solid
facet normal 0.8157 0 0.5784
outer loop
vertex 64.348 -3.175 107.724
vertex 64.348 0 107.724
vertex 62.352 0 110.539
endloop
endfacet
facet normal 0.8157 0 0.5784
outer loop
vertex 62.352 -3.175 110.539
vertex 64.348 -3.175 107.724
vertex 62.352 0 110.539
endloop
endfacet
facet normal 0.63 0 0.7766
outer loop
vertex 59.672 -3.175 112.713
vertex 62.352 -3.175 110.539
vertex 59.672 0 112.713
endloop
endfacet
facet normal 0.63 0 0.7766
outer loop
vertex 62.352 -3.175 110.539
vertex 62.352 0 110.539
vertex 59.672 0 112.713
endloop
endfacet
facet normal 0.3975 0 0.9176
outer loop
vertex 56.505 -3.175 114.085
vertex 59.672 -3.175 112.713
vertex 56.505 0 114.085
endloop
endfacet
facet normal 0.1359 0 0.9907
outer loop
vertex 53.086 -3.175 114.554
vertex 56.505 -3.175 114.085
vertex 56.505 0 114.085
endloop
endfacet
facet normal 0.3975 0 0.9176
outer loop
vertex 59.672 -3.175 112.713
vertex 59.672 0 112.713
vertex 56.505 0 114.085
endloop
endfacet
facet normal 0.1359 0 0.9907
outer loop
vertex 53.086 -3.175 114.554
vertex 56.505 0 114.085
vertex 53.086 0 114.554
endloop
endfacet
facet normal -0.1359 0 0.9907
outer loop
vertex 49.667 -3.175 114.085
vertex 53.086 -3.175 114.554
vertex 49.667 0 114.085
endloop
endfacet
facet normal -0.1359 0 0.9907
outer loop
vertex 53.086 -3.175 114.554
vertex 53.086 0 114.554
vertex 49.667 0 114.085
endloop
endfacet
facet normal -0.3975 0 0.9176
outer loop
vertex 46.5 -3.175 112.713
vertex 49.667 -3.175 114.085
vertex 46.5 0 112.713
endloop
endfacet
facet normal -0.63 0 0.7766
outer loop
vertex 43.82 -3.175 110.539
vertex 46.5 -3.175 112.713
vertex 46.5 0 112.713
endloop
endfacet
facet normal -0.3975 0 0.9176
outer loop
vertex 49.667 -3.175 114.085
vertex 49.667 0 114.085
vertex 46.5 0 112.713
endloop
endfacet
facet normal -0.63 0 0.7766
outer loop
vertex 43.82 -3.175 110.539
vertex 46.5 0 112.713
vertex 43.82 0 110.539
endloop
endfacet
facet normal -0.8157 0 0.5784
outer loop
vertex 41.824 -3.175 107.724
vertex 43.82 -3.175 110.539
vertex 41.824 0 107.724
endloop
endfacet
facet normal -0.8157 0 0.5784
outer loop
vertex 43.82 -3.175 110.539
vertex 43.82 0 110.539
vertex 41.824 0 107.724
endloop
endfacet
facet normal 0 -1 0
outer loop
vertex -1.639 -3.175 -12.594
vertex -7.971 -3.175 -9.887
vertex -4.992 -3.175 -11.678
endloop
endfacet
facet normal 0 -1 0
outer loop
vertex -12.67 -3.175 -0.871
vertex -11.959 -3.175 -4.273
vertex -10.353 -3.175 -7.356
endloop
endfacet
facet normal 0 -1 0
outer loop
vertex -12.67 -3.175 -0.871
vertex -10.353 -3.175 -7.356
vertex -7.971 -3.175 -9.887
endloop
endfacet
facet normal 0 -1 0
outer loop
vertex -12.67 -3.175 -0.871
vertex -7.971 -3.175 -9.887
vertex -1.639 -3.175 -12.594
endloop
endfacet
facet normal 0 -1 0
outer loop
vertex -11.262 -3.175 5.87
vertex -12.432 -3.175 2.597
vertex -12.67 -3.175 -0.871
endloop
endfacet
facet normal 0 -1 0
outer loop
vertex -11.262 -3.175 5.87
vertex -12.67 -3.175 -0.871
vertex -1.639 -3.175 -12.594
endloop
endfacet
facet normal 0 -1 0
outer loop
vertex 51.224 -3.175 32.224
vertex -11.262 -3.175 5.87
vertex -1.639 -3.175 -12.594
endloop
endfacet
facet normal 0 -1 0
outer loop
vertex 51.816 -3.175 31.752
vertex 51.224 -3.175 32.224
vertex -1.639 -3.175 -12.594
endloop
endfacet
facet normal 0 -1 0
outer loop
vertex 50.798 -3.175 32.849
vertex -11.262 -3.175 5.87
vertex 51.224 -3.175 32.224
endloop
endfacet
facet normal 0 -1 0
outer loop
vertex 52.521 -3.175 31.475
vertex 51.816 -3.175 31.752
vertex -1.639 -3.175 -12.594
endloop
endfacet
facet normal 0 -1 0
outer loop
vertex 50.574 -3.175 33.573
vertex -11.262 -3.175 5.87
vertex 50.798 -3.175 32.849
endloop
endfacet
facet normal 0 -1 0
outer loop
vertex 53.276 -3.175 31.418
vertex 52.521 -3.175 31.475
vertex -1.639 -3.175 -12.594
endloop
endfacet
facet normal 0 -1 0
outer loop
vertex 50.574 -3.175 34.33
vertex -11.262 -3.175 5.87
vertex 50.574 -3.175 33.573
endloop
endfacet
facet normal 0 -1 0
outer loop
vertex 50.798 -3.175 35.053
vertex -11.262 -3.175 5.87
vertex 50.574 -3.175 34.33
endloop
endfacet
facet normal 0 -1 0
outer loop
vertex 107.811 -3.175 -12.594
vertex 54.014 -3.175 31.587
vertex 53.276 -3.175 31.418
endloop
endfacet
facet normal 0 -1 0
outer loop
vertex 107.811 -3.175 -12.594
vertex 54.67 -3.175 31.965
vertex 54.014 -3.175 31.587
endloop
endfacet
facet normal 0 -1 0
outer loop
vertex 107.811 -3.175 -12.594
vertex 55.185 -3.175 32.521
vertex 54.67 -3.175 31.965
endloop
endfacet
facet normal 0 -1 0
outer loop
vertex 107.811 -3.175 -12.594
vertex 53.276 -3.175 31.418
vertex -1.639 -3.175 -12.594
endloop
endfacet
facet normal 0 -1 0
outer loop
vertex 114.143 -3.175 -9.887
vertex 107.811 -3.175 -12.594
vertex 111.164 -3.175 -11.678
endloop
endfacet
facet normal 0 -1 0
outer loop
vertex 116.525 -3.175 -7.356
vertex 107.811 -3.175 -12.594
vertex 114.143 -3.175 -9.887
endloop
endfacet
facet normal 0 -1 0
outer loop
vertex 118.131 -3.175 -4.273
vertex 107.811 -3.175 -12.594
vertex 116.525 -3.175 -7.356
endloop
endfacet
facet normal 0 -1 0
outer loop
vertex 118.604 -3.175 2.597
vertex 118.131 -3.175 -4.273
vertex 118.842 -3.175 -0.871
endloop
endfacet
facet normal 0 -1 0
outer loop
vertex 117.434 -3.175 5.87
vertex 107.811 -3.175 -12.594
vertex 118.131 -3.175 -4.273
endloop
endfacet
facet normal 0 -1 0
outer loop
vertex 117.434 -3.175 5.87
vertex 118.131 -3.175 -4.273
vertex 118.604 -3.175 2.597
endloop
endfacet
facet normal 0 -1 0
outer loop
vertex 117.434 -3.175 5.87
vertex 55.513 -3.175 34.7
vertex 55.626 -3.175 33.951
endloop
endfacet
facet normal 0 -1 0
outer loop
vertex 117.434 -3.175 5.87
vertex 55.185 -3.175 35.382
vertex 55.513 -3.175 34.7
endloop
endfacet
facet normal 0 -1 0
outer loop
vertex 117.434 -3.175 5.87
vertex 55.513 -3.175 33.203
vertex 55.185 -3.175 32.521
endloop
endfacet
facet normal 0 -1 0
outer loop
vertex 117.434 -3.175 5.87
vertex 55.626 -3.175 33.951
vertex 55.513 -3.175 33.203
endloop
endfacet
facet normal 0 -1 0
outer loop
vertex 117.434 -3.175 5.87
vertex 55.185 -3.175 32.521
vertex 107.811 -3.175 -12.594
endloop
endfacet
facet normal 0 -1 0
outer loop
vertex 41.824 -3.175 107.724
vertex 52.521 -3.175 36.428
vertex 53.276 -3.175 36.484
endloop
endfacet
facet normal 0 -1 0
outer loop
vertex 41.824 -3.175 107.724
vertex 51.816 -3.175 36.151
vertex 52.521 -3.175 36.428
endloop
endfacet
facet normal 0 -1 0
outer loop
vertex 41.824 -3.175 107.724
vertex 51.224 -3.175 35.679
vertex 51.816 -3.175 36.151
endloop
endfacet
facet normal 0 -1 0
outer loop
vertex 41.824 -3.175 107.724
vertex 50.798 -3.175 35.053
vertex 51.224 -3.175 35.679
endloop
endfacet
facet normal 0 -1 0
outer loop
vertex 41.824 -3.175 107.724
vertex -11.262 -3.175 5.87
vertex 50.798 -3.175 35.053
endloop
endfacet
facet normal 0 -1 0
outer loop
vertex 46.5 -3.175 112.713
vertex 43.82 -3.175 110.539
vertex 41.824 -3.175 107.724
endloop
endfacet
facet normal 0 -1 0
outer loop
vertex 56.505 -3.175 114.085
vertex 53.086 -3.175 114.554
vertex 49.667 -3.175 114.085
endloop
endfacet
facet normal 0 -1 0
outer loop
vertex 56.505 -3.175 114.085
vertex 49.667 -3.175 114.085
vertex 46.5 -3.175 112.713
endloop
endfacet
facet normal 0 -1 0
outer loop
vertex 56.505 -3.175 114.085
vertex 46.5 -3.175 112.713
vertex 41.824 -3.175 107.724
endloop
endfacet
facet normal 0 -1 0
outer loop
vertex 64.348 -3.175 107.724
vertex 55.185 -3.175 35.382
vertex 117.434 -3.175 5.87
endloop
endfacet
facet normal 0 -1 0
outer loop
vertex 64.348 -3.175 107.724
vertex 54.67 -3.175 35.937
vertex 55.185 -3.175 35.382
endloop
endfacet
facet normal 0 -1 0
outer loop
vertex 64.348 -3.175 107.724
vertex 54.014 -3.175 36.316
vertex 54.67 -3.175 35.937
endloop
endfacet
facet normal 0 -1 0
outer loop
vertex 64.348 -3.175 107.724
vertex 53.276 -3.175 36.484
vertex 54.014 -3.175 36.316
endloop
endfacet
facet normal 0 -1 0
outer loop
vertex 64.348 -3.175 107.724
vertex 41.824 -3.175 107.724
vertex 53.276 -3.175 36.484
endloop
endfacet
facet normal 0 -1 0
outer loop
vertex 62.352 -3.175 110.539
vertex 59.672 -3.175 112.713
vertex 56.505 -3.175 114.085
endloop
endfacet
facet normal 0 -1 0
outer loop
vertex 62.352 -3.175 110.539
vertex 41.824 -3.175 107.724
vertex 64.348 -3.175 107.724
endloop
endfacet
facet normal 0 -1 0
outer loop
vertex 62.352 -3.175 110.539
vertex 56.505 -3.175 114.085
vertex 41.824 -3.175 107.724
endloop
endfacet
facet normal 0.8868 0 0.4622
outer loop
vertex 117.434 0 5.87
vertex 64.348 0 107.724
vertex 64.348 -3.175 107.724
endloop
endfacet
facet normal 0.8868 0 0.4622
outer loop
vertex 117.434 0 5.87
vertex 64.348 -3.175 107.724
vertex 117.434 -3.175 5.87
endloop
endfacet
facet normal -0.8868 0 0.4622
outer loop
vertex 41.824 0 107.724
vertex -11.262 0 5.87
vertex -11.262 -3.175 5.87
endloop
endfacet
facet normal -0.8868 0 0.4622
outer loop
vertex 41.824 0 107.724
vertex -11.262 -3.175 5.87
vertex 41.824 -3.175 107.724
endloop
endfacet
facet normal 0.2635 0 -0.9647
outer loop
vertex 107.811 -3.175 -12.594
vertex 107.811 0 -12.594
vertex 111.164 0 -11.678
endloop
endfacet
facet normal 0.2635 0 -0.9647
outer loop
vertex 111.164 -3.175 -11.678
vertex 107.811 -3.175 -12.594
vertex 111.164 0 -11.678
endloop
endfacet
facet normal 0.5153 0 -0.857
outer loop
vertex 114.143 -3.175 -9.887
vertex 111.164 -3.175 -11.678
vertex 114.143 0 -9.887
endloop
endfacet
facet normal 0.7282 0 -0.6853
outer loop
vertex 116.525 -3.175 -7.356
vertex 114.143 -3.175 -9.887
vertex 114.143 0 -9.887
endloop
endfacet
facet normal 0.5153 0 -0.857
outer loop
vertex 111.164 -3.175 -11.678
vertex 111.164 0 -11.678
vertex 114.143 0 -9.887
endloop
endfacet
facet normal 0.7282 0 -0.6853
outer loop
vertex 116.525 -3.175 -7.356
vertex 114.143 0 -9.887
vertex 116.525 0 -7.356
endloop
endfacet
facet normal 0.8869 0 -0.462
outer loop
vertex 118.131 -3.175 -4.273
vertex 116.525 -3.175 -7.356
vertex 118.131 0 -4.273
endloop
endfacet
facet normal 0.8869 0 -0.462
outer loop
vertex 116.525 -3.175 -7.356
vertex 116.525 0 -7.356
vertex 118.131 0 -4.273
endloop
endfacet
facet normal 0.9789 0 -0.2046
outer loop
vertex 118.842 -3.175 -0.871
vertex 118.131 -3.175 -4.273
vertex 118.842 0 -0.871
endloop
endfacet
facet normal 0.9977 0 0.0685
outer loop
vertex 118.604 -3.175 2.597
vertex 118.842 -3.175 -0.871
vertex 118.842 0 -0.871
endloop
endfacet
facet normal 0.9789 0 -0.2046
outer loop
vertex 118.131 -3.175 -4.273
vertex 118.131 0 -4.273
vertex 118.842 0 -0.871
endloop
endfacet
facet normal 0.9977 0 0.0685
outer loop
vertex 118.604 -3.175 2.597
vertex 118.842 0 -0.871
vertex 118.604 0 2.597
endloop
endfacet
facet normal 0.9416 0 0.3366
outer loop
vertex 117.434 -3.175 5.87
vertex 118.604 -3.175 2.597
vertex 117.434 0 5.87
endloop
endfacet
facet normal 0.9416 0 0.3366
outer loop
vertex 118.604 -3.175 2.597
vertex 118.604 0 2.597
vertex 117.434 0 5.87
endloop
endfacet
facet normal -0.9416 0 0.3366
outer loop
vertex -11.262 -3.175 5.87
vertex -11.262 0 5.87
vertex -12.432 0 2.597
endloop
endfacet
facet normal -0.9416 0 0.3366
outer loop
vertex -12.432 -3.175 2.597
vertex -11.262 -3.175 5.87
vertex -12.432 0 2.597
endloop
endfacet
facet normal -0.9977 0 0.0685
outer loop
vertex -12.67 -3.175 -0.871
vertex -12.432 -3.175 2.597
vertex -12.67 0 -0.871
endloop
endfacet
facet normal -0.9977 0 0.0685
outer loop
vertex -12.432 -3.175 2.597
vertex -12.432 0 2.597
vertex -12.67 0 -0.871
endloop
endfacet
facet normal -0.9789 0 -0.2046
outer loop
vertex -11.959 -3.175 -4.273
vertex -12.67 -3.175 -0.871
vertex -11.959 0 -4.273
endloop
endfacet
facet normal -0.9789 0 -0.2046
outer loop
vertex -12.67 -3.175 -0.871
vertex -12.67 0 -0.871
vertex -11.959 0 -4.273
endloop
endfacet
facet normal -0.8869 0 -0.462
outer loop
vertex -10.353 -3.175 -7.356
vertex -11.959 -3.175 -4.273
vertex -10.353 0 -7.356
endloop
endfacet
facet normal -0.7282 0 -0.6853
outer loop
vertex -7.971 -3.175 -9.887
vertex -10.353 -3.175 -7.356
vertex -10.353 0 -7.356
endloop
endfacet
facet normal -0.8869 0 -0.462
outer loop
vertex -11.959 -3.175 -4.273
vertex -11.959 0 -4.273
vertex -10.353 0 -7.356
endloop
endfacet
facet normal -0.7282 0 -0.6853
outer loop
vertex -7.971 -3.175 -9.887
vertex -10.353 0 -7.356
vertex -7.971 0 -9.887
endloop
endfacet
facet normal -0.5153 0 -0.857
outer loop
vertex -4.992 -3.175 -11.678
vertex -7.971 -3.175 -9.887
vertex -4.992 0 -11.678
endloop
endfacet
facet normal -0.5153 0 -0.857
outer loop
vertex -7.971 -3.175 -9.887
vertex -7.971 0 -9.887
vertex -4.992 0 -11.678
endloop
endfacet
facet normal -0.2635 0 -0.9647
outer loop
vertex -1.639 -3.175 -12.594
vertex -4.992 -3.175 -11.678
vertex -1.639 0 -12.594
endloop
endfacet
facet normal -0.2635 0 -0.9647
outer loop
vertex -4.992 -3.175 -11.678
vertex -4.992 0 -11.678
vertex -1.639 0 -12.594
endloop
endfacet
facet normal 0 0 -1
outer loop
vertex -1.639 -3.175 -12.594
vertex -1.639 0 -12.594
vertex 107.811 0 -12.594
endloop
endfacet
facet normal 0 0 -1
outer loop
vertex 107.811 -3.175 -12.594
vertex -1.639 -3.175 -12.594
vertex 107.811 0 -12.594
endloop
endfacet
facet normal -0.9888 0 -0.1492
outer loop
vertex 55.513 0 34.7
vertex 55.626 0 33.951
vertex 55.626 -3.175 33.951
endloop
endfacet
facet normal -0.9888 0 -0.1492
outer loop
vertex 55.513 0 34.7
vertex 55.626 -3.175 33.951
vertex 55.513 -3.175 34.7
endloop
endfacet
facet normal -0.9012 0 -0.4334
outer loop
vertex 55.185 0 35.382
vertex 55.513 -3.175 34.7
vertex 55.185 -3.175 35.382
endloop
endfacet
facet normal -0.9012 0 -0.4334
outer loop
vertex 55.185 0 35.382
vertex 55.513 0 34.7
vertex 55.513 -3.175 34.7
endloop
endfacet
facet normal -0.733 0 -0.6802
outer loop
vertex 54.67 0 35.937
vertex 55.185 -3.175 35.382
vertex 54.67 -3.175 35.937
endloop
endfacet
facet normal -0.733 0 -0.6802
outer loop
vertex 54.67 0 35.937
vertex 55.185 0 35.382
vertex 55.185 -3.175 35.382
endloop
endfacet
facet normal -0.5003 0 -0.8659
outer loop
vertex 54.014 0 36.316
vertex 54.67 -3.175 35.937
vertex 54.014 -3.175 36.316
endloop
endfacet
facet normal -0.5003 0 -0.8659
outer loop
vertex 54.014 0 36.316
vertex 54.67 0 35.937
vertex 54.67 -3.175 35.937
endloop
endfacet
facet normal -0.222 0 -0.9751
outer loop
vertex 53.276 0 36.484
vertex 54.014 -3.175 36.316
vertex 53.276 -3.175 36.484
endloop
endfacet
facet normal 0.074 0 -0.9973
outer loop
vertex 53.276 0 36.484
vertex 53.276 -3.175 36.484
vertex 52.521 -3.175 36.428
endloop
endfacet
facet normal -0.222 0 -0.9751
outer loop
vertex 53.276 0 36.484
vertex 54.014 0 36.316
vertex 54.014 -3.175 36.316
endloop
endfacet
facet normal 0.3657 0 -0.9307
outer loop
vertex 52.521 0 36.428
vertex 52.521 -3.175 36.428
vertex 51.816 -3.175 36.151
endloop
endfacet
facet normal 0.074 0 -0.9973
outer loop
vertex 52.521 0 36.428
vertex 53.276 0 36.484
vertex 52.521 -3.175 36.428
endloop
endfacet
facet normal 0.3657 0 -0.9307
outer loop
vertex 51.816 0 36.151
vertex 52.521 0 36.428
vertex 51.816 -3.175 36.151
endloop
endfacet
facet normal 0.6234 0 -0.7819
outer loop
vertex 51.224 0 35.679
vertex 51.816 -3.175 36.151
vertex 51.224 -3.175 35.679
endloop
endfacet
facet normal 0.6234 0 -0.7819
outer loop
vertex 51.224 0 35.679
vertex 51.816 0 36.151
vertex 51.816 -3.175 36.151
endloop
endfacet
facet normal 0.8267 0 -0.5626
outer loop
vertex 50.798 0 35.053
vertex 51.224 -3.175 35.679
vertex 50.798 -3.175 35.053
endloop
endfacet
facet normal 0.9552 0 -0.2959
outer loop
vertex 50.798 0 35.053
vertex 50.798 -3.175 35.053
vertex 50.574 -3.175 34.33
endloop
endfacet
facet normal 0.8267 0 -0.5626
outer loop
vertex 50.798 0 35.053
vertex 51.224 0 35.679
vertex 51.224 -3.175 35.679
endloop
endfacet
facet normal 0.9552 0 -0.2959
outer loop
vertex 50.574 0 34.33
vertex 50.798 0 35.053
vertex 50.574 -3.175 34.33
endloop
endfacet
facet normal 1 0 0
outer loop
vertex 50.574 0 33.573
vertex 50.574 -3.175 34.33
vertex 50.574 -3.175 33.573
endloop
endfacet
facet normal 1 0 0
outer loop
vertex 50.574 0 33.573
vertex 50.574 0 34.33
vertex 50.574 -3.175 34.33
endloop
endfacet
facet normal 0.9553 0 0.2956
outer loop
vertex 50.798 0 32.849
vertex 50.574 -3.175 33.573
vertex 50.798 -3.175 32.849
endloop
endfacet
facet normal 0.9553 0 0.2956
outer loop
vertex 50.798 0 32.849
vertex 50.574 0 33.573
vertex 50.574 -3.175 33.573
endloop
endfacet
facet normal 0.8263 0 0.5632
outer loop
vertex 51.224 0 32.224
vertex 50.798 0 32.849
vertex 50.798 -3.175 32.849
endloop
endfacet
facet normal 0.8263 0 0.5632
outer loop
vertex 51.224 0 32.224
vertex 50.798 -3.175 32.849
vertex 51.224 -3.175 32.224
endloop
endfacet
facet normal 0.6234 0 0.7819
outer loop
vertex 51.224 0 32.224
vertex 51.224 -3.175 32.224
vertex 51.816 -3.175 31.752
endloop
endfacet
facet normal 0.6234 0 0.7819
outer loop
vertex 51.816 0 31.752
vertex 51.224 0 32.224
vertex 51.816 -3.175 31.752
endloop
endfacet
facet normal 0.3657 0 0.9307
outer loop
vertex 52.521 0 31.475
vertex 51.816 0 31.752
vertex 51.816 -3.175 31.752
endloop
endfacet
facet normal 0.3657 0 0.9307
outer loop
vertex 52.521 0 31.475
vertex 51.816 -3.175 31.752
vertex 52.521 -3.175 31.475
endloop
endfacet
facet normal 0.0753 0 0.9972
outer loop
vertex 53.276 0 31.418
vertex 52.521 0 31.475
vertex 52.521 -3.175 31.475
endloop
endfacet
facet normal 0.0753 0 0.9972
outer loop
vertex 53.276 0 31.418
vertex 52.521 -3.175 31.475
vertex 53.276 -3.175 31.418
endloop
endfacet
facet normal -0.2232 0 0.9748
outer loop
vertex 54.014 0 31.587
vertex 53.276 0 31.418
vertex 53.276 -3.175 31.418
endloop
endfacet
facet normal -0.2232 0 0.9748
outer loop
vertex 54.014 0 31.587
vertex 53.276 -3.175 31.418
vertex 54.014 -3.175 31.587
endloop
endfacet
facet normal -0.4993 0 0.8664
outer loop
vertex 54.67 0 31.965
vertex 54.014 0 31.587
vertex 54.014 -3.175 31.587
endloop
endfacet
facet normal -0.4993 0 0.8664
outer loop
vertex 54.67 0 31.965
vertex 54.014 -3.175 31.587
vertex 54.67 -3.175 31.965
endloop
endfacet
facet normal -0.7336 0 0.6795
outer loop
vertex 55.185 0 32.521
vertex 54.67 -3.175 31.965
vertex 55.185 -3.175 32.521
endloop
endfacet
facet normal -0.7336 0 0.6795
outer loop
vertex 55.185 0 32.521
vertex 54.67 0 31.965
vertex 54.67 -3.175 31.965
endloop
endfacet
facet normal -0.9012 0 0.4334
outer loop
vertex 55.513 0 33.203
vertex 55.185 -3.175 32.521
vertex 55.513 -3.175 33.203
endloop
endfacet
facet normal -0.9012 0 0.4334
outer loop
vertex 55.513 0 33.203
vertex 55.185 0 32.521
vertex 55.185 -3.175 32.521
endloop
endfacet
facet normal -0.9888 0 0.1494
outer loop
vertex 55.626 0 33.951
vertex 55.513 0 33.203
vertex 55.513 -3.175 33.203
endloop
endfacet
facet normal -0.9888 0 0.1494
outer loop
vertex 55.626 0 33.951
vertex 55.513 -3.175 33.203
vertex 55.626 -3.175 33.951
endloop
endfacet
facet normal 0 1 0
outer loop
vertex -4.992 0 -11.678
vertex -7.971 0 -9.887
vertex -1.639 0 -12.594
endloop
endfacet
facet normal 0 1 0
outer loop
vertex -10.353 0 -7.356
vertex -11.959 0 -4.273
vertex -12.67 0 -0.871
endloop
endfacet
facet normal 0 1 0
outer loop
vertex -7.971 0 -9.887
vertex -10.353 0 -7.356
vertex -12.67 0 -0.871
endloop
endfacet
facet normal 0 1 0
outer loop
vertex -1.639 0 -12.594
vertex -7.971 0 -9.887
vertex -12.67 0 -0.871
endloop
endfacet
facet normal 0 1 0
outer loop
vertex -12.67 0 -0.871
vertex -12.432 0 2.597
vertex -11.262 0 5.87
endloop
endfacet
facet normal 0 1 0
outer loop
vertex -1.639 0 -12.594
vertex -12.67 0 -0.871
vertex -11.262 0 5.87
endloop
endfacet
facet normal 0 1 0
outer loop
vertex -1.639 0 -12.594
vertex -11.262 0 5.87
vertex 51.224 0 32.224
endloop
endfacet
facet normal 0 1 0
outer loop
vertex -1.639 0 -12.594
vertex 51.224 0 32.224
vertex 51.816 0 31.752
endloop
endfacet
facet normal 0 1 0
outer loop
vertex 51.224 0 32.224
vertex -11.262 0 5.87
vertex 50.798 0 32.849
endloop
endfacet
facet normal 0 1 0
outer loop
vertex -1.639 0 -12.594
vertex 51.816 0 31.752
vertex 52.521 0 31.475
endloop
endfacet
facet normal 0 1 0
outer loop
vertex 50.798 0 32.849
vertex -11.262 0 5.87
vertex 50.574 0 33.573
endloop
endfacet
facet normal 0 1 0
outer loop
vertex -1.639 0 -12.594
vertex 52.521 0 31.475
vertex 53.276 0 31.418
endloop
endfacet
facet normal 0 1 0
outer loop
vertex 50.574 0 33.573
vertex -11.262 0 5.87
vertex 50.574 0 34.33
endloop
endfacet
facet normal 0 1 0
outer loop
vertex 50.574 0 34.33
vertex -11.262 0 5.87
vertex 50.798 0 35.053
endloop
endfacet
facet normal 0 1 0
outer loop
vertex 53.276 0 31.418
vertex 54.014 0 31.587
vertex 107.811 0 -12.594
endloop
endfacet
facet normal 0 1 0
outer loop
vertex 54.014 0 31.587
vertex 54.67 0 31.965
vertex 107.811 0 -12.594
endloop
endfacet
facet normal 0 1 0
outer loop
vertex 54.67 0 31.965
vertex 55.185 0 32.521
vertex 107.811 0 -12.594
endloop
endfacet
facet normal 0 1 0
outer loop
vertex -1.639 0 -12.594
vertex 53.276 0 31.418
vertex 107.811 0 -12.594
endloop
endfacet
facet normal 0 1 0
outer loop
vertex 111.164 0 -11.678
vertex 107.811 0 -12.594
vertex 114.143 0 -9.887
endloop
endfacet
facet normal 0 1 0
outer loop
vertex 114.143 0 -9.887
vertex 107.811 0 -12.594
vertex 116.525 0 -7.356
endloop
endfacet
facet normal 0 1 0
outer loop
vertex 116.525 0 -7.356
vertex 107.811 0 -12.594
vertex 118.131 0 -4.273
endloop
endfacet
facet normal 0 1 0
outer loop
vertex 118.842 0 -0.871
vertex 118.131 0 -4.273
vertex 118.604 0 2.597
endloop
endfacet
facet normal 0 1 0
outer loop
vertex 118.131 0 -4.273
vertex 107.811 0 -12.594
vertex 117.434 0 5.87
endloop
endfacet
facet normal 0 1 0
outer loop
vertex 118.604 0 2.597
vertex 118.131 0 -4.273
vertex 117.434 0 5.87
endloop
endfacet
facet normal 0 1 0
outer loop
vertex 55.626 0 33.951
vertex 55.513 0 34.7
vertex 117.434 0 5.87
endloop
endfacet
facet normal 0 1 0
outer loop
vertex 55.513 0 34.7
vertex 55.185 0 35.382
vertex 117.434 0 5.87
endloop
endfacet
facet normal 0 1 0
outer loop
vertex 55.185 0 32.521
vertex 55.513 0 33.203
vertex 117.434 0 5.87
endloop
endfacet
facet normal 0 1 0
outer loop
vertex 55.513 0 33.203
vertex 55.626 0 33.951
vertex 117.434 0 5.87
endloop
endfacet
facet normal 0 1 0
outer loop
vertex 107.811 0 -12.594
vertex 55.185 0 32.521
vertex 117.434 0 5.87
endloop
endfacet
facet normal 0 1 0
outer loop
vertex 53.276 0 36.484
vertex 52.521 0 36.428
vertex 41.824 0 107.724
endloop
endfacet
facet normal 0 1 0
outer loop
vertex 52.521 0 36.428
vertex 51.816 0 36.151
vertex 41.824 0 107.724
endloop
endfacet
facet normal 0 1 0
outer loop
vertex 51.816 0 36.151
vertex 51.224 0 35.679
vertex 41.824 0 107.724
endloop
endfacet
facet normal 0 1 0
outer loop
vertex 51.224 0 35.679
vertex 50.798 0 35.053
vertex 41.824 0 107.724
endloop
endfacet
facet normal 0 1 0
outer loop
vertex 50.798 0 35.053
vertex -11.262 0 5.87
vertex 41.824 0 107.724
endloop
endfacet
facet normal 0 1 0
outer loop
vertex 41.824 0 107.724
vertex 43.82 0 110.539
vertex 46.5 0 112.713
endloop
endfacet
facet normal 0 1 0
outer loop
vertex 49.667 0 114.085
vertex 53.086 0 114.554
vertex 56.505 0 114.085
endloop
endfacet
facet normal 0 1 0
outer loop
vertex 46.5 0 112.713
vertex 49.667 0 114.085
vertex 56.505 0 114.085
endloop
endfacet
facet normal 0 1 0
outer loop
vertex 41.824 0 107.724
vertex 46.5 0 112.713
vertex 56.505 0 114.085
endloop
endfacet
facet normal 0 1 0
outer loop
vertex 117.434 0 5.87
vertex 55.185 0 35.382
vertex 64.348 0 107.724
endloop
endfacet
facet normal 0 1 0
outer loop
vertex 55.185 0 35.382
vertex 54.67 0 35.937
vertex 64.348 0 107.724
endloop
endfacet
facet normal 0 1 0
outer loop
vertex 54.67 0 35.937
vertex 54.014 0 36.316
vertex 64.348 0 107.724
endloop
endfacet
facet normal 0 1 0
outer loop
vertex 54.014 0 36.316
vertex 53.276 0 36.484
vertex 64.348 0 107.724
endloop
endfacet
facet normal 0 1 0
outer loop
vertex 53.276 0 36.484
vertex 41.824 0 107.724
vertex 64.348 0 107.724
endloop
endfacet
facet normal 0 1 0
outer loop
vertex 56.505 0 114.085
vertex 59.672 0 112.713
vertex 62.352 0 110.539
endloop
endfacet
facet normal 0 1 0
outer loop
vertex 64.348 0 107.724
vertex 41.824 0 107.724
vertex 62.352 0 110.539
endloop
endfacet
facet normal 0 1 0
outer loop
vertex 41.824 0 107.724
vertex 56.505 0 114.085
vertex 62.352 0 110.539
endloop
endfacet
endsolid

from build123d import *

# Parameters (mm, degrees)
SKETCH_R      = 2.54
EXTRUDE_DEPTH = 3.175


with BuildPart() as part:
    # Sketch → Extrude (new body)
    with BuildSketch(Plane.XZ):
        with BuildLine():
            ThreePointArc((107.810934, -12.593804), (117.43413, -5.869789), (117.434117, 5.869815))
            Line((64.34813, 107.723789), (117.434117, 5.869815))
            ThreePointArc((64.34813, 107.723789), (53.086, 114.554), (41.82387, 107.723789))
            Line((-11.26213, 5.869789), (41.82387, 107.723789))
            ThreePointArc((-11.26213, 5.869789), (-11.26213, -5.869789), (-1.638963, -12.5938))
            Line((-1.638963, -12.5938), (107.810934, -12.593804))
        make_face()
        with Locations((53.086, 33.951333)):
            Circle(SKETCH_R, mode=Mode.SUBTRACT)
    extrude(amount=EXTRUDE_DEPTH)


solid = part.part
